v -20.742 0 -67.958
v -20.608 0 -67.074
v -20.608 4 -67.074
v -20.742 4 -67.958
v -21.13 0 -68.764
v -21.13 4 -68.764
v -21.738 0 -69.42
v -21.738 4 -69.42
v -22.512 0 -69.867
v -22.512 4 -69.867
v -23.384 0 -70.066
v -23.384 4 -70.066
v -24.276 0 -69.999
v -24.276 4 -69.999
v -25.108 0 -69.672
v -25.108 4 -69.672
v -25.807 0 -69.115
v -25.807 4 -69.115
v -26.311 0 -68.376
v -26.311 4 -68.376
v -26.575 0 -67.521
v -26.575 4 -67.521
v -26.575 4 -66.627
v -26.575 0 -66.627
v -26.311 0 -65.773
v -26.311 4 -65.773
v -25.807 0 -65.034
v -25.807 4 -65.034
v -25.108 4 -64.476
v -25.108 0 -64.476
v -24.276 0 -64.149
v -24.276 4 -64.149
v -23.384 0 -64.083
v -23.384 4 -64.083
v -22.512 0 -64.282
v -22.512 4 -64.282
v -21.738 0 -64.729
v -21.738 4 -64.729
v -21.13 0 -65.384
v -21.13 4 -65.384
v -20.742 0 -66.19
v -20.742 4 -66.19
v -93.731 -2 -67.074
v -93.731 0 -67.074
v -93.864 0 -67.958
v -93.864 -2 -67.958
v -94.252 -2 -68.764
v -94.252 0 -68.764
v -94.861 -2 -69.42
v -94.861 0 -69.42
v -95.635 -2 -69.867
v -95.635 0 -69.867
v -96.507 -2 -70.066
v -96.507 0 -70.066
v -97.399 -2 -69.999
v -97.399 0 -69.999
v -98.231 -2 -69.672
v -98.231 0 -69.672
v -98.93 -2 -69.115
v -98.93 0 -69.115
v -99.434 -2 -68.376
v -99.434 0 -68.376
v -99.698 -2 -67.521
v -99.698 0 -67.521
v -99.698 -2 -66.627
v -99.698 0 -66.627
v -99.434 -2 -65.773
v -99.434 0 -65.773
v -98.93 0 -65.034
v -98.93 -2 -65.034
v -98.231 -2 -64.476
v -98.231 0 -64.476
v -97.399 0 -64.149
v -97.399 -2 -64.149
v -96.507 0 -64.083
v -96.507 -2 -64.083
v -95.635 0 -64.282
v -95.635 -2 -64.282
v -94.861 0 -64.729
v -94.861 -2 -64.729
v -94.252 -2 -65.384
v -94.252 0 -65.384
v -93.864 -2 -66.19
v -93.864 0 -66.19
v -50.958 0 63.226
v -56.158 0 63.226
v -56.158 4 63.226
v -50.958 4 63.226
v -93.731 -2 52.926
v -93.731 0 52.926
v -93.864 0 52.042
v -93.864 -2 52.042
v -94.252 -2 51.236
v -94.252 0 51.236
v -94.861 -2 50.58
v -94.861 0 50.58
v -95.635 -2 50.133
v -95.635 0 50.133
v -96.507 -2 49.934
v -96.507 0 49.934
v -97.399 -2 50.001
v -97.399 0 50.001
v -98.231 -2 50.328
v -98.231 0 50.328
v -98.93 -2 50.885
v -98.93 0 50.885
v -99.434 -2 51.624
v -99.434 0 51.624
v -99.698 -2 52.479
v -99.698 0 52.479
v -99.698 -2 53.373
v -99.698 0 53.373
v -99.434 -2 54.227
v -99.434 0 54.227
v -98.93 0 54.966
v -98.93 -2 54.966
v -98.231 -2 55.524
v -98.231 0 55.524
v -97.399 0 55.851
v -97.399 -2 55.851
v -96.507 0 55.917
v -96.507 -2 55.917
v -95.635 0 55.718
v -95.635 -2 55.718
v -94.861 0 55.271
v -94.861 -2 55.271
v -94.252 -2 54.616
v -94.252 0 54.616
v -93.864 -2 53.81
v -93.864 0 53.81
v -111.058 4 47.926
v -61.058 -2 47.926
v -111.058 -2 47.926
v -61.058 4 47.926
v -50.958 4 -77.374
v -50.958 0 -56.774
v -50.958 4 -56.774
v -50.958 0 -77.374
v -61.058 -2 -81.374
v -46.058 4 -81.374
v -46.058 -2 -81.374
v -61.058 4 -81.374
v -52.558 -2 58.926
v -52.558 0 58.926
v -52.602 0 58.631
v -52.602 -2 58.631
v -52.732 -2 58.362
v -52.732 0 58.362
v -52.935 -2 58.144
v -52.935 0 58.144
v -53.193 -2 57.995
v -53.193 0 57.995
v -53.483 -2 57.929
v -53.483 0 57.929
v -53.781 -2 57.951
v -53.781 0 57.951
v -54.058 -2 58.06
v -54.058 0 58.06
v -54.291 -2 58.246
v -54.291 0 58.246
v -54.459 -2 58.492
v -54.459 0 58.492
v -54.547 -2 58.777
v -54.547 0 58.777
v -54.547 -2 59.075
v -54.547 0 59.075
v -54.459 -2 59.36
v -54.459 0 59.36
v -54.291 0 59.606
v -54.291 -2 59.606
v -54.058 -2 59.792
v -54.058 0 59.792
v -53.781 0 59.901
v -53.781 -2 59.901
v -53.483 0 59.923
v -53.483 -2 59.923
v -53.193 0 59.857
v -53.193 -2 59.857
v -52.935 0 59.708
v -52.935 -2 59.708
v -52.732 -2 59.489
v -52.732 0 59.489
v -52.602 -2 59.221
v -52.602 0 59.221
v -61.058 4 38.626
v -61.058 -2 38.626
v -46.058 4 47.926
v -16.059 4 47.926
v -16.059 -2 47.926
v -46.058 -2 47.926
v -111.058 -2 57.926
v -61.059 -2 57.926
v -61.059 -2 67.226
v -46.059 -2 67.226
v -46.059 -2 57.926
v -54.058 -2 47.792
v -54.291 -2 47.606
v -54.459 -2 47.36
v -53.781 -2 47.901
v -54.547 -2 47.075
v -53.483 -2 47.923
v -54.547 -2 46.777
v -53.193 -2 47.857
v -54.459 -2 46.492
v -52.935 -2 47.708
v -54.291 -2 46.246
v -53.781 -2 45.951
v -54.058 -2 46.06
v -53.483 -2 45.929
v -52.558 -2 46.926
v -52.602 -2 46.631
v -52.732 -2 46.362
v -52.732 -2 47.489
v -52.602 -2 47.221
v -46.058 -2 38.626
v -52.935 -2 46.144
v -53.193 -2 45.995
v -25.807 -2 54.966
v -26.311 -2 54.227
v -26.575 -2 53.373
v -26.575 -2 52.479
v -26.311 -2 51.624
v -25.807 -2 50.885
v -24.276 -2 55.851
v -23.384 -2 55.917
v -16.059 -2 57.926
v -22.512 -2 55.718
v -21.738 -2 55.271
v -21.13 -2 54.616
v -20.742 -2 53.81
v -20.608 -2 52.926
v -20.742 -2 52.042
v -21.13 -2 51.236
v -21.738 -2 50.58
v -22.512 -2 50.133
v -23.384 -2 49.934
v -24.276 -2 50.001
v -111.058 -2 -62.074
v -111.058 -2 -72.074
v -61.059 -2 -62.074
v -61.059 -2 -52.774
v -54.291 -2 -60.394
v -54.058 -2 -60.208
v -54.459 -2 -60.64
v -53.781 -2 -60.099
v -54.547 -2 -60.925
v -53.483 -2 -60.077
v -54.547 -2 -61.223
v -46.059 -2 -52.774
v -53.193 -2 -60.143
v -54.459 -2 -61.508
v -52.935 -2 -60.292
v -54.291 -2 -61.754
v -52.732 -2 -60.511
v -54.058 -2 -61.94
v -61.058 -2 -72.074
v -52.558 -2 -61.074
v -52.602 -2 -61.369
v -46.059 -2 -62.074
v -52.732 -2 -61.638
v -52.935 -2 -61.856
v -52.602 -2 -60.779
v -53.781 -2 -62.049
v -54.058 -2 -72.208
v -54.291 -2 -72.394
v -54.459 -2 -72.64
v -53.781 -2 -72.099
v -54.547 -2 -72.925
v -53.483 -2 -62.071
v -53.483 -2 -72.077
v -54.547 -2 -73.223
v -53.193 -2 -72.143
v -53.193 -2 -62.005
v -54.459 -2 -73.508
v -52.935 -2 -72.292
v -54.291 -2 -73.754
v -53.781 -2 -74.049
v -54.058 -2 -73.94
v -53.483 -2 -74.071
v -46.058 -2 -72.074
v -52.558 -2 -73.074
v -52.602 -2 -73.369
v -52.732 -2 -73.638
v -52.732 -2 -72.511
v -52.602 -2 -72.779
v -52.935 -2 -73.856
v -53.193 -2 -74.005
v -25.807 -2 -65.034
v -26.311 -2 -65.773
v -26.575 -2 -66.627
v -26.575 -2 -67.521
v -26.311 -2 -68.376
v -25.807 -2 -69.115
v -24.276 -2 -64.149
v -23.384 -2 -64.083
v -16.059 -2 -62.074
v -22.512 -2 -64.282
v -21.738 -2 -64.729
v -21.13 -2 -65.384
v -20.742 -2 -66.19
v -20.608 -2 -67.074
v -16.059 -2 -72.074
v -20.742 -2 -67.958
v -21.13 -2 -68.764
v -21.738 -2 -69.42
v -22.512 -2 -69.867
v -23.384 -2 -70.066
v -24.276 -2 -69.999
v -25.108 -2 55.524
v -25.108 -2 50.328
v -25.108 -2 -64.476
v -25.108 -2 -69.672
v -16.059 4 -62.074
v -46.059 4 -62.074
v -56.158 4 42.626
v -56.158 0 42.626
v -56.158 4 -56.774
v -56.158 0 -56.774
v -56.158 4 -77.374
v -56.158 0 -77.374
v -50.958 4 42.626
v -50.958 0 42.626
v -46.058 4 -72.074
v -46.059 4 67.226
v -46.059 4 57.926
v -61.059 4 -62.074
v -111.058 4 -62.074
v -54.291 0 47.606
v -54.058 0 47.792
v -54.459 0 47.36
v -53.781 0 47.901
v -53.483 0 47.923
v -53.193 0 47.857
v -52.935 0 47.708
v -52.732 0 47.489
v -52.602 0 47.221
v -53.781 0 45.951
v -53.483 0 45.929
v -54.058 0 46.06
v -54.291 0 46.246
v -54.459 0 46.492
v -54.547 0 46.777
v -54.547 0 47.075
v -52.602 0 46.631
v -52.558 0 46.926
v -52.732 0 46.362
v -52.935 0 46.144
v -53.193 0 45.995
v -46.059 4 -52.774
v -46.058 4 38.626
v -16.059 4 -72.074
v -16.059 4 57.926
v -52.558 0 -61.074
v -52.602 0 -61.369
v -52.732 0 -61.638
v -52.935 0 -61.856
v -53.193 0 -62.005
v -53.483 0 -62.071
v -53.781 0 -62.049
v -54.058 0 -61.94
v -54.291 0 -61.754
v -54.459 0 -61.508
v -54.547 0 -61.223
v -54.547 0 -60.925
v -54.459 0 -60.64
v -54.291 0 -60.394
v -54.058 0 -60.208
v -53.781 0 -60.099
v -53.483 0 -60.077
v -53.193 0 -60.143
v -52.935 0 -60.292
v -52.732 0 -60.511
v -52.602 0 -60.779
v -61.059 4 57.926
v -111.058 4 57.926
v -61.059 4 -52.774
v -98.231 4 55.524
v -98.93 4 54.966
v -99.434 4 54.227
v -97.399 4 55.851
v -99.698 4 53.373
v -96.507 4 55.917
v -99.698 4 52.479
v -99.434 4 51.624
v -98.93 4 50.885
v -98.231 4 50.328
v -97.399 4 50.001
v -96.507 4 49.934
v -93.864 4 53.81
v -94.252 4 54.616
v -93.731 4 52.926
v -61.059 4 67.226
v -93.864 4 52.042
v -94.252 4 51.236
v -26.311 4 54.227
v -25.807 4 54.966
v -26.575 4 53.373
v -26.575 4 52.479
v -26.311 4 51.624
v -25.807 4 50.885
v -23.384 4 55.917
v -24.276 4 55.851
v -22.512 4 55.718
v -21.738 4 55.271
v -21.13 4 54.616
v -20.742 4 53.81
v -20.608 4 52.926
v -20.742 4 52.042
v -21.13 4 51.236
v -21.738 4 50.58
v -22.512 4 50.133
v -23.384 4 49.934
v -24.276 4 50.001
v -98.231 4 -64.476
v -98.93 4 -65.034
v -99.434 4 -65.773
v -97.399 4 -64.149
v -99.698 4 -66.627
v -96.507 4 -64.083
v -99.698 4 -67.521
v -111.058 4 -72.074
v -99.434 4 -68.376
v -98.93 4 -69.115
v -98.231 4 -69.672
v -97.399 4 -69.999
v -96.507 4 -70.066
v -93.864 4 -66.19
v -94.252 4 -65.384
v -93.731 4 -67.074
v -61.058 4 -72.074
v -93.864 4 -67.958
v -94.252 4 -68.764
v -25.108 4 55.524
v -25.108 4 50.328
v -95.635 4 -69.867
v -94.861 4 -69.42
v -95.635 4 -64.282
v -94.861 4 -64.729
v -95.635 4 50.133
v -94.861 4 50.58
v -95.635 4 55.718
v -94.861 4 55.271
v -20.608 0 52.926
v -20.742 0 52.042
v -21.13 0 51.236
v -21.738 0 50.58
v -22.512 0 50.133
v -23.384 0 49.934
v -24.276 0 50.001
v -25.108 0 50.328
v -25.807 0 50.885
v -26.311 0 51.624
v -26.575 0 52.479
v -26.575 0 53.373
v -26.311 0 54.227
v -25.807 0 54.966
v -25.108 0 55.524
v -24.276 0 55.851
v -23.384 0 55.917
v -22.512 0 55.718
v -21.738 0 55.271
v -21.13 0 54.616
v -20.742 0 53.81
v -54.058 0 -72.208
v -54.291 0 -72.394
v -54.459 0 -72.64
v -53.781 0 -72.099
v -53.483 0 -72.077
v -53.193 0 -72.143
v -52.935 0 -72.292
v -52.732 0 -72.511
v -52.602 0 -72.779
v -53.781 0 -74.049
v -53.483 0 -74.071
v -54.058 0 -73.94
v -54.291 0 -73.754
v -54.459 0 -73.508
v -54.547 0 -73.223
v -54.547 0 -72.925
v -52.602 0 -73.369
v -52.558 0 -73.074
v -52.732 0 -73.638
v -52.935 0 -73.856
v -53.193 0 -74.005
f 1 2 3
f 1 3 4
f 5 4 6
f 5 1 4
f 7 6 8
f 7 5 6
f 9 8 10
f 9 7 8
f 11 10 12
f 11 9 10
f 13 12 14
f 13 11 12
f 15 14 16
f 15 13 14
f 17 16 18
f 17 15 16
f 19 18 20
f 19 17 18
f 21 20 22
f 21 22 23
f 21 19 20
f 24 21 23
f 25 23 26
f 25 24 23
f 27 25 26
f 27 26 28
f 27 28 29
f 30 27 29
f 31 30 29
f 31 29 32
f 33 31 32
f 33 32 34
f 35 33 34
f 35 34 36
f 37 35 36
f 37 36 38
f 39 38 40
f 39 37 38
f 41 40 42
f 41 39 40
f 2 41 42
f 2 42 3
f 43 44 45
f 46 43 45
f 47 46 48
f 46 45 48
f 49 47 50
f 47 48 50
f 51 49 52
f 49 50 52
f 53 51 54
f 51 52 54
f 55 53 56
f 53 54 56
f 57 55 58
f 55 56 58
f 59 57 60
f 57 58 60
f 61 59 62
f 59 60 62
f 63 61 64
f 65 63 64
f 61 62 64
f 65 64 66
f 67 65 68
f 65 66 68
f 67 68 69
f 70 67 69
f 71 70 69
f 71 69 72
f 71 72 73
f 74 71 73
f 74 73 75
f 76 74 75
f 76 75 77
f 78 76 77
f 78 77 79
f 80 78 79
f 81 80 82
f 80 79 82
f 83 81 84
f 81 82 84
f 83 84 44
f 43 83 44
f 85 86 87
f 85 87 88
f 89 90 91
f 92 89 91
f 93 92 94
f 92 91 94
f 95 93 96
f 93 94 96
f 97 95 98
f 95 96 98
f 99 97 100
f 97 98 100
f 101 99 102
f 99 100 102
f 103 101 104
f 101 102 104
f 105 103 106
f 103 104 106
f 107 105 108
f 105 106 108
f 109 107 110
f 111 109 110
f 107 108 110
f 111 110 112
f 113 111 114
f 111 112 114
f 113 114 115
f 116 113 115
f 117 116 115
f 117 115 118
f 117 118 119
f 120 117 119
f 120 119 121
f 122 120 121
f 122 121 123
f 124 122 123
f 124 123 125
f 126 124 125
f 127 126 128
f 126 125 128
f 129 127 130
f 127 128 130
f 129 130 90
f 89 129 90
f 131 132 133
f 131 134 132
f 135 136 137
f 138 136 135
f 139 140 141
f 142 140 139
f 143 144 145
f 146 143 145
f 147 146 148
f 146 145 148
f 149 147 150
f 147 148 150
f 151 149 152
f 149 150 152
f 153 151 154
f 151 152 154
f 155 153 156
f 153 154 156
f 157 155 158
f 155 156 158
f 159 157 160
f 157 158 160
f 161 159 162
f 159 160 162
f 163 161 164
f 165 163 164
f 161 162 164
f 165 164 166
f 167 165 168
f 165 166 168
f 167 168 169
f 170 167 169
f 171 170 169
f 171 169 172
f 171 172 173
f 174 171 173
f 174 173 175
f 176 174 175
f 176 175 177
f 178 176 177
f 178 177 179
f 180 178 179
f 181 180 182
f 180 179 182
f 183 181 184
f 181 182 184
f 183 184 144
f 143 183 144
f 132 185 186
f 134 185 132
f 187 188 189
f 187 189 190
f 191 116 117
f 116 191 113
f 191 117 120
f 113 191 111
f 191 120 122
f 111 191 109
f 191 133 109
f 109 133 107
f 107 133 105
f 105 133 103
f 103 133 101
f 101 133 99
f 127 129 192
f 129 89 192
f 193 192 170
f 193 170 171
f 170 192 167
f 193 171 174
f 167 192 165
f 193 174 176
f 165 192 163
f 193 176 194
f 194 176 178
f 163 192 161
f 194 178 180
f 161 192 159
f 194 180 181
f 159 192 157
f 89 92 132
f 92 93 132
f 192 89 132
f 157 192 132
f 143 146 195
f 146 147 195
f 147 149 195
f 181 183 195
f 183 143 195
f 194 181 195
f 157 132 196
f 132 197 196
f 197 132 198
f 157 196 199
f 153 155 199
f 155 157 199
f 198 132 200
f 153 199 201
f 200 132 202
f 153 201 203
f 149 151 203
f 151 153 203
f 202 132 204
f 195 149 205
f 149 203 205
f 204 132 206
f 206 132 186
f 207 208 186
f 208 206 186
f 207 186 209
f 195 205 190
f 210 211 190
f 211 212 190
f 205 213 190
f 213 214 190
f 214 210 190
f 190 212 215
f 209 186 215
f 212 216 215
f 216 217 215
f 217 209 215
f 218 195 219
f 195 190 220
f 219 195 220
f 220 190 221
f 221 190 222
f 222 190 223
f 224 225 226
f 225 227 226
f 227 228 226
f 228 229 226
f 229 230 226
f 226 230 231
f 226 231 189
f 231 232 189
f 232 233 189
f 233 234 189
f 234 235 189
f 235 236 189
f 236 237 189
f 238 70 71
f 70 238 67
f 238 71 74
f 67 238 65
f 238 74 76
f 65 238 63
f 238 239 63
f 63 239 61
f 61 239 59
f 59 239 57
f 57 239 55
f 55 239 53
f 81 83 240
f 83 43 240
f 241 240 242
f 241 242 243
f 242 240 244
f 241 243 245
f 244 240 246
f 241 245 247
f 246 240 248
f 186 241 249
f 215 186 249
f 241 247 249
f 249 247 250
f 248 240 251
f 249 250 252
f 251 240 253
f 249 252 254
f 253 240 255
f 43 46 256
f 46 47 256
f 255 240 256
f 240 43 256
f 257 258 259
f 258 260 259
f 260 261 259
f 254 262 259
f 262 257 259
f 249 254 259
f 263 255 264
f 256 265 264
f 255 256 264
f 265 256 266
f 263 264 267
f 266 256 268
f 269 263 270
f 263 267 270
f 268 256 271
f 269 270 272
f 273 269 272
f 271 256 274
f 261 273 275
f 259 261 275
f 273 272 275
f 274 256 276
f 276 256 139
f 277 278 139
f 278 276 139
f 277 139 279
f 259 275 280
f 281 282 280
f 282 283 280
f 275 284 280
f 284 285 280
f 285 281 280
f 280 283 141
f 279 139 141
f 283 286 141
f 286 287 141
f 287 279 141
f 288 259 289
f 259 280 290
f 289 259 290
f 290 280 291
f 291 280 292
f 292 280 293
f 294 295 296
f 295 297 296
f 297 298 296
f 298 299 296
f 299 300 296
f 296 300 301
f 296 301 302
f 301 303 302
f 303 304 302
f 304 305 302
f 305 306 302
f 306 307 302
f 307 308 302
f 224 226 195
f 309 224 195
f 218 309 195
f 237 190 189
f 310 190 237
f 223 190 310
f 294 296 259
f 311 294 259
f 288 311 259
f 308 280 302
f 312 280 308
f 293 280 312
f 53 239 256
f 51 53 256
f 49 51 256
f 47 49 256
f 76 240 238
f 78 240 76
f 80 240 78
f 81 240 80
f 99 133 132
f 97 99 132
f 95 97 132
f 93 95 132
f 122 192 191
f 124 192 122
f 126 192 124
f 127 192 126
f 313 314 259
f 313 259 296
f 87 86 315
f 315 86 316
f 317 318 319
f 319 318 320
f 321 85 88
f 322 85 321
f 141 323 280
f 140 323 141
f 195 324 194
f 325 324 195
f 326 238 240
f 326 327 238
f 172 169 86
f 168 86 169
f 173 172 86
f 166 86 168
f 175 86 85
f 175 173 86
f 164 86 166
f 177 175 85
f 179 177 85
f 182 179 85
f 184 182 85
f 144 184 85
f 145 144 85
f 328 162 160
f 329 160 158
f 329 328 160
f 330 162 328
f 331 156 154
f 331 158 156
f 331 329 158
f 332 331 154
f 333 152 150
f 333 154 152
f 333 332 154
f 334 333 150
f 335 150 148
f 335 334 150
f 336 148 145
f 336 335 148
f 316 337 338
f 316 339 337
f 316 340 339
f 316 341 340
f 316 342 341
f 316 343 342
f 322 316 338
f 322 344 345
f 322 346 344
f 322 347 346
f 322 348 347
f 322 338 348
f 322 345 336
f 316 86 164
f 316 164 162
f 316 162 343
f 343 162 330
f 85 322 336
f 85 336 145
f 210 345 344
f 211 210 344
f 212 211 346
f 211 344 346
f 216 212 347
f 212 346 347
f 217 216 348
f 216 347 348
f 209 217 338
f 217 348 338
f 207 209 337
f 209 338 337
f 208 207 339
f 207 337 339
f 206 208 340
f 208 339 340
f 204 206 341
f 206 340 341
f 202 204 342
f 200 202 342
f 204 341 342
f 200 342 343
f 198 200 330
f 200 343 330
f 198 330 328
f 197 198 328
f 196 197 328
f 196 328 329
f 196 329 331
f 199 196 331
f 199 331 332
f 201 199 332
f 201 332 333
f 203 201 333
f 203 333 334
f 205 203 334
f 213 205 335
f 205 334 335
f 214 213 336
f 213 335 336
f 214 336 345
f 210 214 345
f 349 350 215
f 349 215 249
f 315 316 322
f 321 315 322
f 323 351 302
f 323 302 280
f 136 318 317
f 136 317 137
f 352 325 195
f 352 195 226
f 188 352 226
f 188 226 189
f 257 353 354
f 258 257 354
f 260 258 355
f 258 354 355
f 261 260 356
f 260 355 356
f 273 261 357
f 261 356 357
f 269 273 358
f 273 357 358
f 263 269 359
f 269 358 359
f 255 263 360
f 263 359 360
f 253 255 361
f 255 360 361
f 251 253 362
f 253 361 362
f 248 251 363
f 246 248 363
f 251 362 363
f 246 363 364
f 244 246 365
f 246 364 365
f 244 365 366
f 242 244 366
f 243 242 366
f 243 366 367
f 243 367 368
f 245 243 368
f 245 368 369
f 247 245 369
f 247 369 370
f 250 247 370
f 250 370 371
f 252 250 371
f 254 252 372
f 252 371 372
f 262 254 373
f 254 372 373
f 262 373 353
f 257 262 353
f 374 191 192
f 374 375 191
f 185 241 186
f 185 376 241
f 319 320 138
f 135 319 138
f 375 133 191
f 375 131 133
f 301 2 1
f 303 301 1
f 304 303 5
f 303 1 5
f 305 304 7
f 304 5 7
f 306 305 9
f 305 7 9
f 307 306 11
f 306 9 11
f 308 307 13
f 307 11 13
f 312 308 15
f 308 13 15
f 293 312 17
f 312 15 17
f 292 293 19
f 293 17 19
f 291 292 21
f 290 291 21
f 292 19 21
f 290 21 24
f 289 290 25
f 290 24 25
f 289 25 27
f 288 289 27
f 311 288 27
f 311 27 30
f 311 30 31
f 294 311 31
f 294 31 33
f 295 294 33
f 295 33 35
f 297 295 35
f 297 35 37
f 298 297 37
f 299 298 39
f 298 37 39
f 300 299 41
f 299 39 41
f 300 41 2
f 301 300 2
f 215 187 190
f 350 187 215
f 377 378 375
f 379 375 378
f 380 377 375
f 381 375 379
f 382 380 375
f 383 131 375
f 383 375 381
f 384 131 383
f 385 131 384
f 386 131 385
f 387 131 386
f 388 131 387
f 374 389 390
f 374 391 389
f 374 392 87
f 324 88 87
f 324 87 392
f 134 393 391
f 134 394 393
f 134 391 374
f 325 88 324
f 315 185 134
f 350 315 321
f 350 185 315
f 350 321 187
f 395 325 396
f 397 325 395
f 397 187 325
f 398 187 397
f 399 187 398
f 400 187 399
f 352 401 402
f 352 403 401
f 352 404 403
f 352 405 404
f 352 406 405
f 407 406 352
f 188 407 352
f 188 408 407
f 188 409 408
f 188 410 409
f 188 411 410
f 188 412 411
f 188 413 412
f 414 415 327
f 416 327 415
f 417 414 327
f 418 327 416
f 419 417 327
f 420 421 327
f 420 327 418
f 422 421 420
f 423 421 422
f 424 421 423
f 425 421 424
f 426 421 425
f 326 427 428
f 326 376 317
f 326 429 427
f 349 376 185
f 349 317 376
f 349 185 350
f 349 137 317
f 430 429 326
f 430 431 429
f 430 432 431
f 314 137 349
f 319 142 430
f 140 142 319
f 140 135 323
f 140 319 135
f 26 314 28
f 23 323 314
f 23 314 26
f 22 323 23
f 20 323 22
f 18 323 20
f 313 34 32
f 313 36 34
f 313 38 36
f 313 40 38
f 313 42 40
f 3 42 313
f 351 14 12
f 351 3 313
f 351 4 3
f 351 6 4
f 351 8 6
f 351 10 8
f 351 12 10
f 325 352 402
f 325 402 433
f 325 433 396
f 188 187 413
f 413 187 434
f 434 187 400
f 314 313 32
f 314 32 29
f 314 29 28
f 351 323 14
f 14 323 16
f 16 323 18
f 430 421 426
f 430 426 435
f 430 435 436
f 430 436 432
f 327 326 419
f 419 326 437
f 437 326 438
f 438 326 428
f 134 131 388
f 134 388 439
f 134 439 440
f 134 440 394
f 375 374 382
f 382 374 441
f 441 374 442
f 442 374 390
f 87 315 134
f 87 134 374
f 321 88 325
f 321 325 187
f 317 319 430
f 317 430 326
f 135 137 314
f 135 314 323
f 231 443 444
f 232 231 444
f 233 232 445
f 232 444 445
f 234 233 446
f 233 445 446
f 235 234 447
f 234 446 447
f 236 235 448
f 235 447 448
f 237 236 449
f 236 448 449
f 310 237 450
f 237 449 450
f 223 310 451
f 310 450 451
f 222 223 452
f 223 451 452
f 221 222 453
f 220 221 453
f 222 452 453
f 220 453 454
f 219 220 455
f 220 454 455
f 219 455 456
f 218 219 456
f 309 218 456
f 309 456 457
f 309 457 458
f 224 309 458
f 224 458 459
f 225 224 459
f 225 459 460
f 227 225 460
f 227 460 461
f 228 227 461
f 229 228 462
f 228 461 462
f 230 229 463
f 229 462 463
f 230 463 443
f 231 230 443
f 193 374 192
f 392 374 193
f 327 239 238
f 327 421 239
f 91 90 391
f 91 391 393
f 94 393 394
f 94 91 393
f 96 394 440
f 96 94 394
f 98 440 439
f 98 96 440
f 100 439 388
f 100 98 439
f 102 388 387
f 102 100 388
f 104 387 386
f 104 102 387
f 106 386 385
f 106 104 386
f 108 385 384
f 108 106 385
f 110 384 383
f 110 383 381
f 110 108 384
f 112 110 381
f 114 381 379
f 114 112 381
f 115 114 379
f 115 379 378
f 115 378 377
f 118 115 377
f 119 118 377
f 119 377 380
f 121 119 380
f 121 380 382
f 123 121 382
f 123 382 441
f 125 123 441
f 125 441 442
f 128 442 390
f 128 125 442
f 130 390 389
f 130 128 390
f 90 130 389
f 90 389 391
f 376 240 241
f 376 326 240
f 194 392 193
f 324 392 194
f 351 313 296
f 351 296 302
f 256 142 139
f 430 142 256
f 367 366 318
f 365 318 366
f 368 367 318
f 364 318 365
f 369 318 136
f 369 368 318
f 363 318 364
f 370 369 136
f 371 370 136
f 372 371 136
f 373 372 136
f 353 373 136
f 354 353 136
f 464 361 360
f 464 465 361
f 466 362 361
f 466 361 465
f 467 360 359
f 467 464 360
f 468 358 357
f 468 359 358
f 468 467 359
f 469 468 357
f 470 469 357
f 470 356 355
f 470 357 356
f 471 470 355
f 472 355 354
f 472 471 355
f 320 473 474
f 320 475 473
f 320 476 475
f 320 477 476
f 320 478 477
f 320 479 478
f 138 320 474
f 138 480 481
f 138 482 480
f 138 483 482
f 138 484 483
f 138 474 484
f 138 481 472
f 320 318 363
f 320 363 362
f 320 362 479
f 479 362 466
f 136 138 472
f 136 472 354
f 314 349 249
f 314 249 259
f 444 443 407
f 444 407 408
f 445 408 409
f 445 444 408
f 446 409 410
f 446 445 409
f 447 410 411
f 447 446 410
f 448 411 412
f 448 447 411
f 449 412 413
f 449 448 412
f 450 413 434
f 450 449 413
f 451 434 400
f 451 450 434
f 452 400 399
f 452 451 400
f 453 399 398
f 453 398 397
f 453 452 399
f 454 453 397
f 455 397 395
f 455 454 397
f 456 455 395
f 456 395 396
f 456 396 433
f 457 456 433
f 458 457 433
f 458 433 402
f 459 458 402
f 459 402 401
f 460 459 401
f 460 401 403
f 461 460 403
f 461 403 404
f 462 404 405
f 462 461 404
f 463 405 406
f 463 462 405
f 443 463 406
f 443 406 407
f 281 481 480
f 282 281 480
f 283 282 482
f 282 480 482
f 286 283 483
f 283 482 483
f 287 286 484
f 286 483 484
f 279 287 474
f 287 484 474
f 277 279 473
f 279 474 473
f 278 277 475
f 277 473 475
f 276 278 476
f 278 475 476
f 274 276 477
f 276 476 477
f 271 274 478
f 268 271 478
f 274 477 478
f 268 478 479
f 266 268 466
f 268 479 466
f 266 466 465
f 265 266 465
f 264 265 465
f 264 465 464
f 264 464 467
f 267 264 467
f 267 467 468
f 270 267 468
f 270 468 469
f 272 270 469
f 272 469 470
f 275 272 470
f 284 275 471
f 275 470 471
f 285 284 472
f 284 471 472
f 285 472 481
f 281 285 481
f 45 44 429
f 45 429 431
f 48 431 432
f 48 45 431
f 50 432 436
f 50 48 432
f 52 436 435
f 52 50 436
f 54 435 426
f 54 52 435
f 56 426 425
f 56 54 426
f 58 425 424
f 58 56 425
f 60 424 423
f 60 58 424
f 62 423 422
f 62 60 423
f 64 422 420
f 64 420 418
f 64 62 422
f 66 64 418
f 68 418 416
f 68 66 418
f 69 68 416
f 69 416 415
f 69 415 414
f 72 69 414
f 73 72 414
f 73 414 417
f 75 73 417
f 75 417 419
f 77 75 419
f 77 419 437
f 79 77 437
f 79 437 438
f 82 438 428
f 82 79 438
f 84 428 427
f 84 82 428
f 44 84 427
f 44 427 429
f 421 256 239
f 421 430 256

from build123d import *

# Parameters (mm, degrees)
SKETCH1_4_R         = 3
SKETCH1_4_W         = 5.2
SKETCH1_4_H         = 20.6
BOSS_EXTRUDE2_DEPTH = 4
BOSS_EXTRUDE3_START = -2
SKETCH1_5_R         = 3
SKETCH1_5_R_2       = 1
BOSS_EXTRUDE3_DEPTH = 2


with BuildPart() as part:
    # Sketch1_4 → Boss-Extrude2 (new body)
    with BuildSketch(Plane(origin=(0, 0, 0), x_dir=(1, 0, 0), z_dir=(0, 1, 0))):
        Polygon((-61.058774723, -57.925766481), (-61.058774723, -67.225766481), (-46.058774723, -67.225766481), (-46.058774723, -57.925766481), (-16.058774723, -57.925766481), (-16.058774723, -47.925766481), (-46.058065355, -47.925766481), (-46.058065355, -38.625766481), (-46.058774723, 52.774233519), (-46.058774723, 62.074233519), (-16.058774723, 62.074233519), (-16.058774723, 72.074233519), (-46.058065355, 72.074233519), (-46.058065355, 81.374233519), (-61.058065355, 81.374233519), (-61.058065355, 72.074233519), (-111.058065355, 72.074233519), (-111.058065355, 62.074233519), (-61.058774723, 62.074233519), (-61.058774723, 52.774233519), (-61.058065355, -38.625766481), (-61.058065355, -47.925766481), (-111.058065355, -47.925766481), (-111.058065355, -57.925766481), align=None)
        with Locations((-96.731187499, -52.925766481)):
            Circle(SKETCH1_4_R, mode=Mode.SUBTRACT)
        with Locations((-53.558065355, -52.925766481)):
            Rectangle(SKETCH1_4_W, SKETCH1_4_H, mode=Mode.SUBTRACT)
        with Locations((-23.608327945, -52.925766481)):
            Circle(SKETCH1_4_R, mode=Mode.SUBTRACT)
        with Locations((-23.608327945, 67.074233519)):
            Circle(SKETCH1_4_R, mode=Mode.SUBTRACT)
        with Locations((-96.731187499, 67.074233519)):
            Circle(SKETCH1_4_R, mode=Mode.SUBTRACT)
        with Locations((-53.558065355, 67.074233519)):
            Rectangle(SKETCH1_4_W, SKETCH1_4_H, mode=Mode.SUBTRACT)
    extrude(amount=BOSS_EXTRUDE2_DEPTH)

    # Sketch1_5 → Boss-Extrude3 (add)
    with BuildSketch(Plane(origin=(0, 0, 0), x_dir=(1, 0, 0), z_dir=(0, 1, 0)).offset(BOSS_EXTRUDE3_START)):
        Polygon((-61.058774723, -57.925766481), (-61.058774723, -67.225766481), (-46.058774723, -67.225766481), (-46.058774723, -57.925766481), (-16.058774723, -57.925766481), (-16.058774723, -47.925766481), (-46.058065355, -47.925766481), (-46.058065355, -38.625766481), (-46.058774723, 52.774233519), (-46.058774723, 62.074233519), (-16.058774723, 62.074233519), (-16.058774723, 72.074233519), (-46.058065355, 72.074233519), (-46.058065355, 81.374233519), (-61.058065355, 81.374233519), (-61.058065355, 72.074233519), (-111.058065355, 72.074233519), (-111.058065355, 62.074233519), (-61.058774723, 62.074233519), (-61.058774723, 52.774233519), (-61.058065355, -38.625766481), (-61.058065355, -47.925766481), (-111.058065355, -47.925766481), (-111.058065355, -57.925766481), align=None)
        with Locations((-96.731187499, -52.925766481)):
            Circle(SKETCH1_5_R, mode=Mode.SUBTRACT)
        with Locations((-23.608327945, -52.925766481)):
            Circle(SKETCH1_5_R, mode=Mode.SUBTRACT)
        with Locations((-53.558065355, -58.925766481)):
            Circle(SKETCH1_5_R_2, mode=Mode.SUBTRACT)
        with Locations((-53.558065355, -46.925766481)):
            Circle(SKETCH1_5_R_2, mode=Mode.SUBTRACT)
        with Locations((-23.608327945, 67.074233519)):
            Circle(SKETCH1_5_R, mode=Mode.SUBTRACT)
        with Locations((-96.731187499, 67.074233519)):
            Circle(SKETCH1_5_R, mode=Mode.SUBTRACT)
        with Locations((-53.558065355, 61.074233519)):
            Circle(SKETCH1_5_R_2, mode=Mode.SUBTRACT)
        with Locations((-53.558065355, 73.074233519)):
            Circle(SKETCH1_5_R_2, mode=Mode.SUBTRACT)
    extrude(amount=BOSS_EXTRUDE3_DEPTH)


solid = part.part
